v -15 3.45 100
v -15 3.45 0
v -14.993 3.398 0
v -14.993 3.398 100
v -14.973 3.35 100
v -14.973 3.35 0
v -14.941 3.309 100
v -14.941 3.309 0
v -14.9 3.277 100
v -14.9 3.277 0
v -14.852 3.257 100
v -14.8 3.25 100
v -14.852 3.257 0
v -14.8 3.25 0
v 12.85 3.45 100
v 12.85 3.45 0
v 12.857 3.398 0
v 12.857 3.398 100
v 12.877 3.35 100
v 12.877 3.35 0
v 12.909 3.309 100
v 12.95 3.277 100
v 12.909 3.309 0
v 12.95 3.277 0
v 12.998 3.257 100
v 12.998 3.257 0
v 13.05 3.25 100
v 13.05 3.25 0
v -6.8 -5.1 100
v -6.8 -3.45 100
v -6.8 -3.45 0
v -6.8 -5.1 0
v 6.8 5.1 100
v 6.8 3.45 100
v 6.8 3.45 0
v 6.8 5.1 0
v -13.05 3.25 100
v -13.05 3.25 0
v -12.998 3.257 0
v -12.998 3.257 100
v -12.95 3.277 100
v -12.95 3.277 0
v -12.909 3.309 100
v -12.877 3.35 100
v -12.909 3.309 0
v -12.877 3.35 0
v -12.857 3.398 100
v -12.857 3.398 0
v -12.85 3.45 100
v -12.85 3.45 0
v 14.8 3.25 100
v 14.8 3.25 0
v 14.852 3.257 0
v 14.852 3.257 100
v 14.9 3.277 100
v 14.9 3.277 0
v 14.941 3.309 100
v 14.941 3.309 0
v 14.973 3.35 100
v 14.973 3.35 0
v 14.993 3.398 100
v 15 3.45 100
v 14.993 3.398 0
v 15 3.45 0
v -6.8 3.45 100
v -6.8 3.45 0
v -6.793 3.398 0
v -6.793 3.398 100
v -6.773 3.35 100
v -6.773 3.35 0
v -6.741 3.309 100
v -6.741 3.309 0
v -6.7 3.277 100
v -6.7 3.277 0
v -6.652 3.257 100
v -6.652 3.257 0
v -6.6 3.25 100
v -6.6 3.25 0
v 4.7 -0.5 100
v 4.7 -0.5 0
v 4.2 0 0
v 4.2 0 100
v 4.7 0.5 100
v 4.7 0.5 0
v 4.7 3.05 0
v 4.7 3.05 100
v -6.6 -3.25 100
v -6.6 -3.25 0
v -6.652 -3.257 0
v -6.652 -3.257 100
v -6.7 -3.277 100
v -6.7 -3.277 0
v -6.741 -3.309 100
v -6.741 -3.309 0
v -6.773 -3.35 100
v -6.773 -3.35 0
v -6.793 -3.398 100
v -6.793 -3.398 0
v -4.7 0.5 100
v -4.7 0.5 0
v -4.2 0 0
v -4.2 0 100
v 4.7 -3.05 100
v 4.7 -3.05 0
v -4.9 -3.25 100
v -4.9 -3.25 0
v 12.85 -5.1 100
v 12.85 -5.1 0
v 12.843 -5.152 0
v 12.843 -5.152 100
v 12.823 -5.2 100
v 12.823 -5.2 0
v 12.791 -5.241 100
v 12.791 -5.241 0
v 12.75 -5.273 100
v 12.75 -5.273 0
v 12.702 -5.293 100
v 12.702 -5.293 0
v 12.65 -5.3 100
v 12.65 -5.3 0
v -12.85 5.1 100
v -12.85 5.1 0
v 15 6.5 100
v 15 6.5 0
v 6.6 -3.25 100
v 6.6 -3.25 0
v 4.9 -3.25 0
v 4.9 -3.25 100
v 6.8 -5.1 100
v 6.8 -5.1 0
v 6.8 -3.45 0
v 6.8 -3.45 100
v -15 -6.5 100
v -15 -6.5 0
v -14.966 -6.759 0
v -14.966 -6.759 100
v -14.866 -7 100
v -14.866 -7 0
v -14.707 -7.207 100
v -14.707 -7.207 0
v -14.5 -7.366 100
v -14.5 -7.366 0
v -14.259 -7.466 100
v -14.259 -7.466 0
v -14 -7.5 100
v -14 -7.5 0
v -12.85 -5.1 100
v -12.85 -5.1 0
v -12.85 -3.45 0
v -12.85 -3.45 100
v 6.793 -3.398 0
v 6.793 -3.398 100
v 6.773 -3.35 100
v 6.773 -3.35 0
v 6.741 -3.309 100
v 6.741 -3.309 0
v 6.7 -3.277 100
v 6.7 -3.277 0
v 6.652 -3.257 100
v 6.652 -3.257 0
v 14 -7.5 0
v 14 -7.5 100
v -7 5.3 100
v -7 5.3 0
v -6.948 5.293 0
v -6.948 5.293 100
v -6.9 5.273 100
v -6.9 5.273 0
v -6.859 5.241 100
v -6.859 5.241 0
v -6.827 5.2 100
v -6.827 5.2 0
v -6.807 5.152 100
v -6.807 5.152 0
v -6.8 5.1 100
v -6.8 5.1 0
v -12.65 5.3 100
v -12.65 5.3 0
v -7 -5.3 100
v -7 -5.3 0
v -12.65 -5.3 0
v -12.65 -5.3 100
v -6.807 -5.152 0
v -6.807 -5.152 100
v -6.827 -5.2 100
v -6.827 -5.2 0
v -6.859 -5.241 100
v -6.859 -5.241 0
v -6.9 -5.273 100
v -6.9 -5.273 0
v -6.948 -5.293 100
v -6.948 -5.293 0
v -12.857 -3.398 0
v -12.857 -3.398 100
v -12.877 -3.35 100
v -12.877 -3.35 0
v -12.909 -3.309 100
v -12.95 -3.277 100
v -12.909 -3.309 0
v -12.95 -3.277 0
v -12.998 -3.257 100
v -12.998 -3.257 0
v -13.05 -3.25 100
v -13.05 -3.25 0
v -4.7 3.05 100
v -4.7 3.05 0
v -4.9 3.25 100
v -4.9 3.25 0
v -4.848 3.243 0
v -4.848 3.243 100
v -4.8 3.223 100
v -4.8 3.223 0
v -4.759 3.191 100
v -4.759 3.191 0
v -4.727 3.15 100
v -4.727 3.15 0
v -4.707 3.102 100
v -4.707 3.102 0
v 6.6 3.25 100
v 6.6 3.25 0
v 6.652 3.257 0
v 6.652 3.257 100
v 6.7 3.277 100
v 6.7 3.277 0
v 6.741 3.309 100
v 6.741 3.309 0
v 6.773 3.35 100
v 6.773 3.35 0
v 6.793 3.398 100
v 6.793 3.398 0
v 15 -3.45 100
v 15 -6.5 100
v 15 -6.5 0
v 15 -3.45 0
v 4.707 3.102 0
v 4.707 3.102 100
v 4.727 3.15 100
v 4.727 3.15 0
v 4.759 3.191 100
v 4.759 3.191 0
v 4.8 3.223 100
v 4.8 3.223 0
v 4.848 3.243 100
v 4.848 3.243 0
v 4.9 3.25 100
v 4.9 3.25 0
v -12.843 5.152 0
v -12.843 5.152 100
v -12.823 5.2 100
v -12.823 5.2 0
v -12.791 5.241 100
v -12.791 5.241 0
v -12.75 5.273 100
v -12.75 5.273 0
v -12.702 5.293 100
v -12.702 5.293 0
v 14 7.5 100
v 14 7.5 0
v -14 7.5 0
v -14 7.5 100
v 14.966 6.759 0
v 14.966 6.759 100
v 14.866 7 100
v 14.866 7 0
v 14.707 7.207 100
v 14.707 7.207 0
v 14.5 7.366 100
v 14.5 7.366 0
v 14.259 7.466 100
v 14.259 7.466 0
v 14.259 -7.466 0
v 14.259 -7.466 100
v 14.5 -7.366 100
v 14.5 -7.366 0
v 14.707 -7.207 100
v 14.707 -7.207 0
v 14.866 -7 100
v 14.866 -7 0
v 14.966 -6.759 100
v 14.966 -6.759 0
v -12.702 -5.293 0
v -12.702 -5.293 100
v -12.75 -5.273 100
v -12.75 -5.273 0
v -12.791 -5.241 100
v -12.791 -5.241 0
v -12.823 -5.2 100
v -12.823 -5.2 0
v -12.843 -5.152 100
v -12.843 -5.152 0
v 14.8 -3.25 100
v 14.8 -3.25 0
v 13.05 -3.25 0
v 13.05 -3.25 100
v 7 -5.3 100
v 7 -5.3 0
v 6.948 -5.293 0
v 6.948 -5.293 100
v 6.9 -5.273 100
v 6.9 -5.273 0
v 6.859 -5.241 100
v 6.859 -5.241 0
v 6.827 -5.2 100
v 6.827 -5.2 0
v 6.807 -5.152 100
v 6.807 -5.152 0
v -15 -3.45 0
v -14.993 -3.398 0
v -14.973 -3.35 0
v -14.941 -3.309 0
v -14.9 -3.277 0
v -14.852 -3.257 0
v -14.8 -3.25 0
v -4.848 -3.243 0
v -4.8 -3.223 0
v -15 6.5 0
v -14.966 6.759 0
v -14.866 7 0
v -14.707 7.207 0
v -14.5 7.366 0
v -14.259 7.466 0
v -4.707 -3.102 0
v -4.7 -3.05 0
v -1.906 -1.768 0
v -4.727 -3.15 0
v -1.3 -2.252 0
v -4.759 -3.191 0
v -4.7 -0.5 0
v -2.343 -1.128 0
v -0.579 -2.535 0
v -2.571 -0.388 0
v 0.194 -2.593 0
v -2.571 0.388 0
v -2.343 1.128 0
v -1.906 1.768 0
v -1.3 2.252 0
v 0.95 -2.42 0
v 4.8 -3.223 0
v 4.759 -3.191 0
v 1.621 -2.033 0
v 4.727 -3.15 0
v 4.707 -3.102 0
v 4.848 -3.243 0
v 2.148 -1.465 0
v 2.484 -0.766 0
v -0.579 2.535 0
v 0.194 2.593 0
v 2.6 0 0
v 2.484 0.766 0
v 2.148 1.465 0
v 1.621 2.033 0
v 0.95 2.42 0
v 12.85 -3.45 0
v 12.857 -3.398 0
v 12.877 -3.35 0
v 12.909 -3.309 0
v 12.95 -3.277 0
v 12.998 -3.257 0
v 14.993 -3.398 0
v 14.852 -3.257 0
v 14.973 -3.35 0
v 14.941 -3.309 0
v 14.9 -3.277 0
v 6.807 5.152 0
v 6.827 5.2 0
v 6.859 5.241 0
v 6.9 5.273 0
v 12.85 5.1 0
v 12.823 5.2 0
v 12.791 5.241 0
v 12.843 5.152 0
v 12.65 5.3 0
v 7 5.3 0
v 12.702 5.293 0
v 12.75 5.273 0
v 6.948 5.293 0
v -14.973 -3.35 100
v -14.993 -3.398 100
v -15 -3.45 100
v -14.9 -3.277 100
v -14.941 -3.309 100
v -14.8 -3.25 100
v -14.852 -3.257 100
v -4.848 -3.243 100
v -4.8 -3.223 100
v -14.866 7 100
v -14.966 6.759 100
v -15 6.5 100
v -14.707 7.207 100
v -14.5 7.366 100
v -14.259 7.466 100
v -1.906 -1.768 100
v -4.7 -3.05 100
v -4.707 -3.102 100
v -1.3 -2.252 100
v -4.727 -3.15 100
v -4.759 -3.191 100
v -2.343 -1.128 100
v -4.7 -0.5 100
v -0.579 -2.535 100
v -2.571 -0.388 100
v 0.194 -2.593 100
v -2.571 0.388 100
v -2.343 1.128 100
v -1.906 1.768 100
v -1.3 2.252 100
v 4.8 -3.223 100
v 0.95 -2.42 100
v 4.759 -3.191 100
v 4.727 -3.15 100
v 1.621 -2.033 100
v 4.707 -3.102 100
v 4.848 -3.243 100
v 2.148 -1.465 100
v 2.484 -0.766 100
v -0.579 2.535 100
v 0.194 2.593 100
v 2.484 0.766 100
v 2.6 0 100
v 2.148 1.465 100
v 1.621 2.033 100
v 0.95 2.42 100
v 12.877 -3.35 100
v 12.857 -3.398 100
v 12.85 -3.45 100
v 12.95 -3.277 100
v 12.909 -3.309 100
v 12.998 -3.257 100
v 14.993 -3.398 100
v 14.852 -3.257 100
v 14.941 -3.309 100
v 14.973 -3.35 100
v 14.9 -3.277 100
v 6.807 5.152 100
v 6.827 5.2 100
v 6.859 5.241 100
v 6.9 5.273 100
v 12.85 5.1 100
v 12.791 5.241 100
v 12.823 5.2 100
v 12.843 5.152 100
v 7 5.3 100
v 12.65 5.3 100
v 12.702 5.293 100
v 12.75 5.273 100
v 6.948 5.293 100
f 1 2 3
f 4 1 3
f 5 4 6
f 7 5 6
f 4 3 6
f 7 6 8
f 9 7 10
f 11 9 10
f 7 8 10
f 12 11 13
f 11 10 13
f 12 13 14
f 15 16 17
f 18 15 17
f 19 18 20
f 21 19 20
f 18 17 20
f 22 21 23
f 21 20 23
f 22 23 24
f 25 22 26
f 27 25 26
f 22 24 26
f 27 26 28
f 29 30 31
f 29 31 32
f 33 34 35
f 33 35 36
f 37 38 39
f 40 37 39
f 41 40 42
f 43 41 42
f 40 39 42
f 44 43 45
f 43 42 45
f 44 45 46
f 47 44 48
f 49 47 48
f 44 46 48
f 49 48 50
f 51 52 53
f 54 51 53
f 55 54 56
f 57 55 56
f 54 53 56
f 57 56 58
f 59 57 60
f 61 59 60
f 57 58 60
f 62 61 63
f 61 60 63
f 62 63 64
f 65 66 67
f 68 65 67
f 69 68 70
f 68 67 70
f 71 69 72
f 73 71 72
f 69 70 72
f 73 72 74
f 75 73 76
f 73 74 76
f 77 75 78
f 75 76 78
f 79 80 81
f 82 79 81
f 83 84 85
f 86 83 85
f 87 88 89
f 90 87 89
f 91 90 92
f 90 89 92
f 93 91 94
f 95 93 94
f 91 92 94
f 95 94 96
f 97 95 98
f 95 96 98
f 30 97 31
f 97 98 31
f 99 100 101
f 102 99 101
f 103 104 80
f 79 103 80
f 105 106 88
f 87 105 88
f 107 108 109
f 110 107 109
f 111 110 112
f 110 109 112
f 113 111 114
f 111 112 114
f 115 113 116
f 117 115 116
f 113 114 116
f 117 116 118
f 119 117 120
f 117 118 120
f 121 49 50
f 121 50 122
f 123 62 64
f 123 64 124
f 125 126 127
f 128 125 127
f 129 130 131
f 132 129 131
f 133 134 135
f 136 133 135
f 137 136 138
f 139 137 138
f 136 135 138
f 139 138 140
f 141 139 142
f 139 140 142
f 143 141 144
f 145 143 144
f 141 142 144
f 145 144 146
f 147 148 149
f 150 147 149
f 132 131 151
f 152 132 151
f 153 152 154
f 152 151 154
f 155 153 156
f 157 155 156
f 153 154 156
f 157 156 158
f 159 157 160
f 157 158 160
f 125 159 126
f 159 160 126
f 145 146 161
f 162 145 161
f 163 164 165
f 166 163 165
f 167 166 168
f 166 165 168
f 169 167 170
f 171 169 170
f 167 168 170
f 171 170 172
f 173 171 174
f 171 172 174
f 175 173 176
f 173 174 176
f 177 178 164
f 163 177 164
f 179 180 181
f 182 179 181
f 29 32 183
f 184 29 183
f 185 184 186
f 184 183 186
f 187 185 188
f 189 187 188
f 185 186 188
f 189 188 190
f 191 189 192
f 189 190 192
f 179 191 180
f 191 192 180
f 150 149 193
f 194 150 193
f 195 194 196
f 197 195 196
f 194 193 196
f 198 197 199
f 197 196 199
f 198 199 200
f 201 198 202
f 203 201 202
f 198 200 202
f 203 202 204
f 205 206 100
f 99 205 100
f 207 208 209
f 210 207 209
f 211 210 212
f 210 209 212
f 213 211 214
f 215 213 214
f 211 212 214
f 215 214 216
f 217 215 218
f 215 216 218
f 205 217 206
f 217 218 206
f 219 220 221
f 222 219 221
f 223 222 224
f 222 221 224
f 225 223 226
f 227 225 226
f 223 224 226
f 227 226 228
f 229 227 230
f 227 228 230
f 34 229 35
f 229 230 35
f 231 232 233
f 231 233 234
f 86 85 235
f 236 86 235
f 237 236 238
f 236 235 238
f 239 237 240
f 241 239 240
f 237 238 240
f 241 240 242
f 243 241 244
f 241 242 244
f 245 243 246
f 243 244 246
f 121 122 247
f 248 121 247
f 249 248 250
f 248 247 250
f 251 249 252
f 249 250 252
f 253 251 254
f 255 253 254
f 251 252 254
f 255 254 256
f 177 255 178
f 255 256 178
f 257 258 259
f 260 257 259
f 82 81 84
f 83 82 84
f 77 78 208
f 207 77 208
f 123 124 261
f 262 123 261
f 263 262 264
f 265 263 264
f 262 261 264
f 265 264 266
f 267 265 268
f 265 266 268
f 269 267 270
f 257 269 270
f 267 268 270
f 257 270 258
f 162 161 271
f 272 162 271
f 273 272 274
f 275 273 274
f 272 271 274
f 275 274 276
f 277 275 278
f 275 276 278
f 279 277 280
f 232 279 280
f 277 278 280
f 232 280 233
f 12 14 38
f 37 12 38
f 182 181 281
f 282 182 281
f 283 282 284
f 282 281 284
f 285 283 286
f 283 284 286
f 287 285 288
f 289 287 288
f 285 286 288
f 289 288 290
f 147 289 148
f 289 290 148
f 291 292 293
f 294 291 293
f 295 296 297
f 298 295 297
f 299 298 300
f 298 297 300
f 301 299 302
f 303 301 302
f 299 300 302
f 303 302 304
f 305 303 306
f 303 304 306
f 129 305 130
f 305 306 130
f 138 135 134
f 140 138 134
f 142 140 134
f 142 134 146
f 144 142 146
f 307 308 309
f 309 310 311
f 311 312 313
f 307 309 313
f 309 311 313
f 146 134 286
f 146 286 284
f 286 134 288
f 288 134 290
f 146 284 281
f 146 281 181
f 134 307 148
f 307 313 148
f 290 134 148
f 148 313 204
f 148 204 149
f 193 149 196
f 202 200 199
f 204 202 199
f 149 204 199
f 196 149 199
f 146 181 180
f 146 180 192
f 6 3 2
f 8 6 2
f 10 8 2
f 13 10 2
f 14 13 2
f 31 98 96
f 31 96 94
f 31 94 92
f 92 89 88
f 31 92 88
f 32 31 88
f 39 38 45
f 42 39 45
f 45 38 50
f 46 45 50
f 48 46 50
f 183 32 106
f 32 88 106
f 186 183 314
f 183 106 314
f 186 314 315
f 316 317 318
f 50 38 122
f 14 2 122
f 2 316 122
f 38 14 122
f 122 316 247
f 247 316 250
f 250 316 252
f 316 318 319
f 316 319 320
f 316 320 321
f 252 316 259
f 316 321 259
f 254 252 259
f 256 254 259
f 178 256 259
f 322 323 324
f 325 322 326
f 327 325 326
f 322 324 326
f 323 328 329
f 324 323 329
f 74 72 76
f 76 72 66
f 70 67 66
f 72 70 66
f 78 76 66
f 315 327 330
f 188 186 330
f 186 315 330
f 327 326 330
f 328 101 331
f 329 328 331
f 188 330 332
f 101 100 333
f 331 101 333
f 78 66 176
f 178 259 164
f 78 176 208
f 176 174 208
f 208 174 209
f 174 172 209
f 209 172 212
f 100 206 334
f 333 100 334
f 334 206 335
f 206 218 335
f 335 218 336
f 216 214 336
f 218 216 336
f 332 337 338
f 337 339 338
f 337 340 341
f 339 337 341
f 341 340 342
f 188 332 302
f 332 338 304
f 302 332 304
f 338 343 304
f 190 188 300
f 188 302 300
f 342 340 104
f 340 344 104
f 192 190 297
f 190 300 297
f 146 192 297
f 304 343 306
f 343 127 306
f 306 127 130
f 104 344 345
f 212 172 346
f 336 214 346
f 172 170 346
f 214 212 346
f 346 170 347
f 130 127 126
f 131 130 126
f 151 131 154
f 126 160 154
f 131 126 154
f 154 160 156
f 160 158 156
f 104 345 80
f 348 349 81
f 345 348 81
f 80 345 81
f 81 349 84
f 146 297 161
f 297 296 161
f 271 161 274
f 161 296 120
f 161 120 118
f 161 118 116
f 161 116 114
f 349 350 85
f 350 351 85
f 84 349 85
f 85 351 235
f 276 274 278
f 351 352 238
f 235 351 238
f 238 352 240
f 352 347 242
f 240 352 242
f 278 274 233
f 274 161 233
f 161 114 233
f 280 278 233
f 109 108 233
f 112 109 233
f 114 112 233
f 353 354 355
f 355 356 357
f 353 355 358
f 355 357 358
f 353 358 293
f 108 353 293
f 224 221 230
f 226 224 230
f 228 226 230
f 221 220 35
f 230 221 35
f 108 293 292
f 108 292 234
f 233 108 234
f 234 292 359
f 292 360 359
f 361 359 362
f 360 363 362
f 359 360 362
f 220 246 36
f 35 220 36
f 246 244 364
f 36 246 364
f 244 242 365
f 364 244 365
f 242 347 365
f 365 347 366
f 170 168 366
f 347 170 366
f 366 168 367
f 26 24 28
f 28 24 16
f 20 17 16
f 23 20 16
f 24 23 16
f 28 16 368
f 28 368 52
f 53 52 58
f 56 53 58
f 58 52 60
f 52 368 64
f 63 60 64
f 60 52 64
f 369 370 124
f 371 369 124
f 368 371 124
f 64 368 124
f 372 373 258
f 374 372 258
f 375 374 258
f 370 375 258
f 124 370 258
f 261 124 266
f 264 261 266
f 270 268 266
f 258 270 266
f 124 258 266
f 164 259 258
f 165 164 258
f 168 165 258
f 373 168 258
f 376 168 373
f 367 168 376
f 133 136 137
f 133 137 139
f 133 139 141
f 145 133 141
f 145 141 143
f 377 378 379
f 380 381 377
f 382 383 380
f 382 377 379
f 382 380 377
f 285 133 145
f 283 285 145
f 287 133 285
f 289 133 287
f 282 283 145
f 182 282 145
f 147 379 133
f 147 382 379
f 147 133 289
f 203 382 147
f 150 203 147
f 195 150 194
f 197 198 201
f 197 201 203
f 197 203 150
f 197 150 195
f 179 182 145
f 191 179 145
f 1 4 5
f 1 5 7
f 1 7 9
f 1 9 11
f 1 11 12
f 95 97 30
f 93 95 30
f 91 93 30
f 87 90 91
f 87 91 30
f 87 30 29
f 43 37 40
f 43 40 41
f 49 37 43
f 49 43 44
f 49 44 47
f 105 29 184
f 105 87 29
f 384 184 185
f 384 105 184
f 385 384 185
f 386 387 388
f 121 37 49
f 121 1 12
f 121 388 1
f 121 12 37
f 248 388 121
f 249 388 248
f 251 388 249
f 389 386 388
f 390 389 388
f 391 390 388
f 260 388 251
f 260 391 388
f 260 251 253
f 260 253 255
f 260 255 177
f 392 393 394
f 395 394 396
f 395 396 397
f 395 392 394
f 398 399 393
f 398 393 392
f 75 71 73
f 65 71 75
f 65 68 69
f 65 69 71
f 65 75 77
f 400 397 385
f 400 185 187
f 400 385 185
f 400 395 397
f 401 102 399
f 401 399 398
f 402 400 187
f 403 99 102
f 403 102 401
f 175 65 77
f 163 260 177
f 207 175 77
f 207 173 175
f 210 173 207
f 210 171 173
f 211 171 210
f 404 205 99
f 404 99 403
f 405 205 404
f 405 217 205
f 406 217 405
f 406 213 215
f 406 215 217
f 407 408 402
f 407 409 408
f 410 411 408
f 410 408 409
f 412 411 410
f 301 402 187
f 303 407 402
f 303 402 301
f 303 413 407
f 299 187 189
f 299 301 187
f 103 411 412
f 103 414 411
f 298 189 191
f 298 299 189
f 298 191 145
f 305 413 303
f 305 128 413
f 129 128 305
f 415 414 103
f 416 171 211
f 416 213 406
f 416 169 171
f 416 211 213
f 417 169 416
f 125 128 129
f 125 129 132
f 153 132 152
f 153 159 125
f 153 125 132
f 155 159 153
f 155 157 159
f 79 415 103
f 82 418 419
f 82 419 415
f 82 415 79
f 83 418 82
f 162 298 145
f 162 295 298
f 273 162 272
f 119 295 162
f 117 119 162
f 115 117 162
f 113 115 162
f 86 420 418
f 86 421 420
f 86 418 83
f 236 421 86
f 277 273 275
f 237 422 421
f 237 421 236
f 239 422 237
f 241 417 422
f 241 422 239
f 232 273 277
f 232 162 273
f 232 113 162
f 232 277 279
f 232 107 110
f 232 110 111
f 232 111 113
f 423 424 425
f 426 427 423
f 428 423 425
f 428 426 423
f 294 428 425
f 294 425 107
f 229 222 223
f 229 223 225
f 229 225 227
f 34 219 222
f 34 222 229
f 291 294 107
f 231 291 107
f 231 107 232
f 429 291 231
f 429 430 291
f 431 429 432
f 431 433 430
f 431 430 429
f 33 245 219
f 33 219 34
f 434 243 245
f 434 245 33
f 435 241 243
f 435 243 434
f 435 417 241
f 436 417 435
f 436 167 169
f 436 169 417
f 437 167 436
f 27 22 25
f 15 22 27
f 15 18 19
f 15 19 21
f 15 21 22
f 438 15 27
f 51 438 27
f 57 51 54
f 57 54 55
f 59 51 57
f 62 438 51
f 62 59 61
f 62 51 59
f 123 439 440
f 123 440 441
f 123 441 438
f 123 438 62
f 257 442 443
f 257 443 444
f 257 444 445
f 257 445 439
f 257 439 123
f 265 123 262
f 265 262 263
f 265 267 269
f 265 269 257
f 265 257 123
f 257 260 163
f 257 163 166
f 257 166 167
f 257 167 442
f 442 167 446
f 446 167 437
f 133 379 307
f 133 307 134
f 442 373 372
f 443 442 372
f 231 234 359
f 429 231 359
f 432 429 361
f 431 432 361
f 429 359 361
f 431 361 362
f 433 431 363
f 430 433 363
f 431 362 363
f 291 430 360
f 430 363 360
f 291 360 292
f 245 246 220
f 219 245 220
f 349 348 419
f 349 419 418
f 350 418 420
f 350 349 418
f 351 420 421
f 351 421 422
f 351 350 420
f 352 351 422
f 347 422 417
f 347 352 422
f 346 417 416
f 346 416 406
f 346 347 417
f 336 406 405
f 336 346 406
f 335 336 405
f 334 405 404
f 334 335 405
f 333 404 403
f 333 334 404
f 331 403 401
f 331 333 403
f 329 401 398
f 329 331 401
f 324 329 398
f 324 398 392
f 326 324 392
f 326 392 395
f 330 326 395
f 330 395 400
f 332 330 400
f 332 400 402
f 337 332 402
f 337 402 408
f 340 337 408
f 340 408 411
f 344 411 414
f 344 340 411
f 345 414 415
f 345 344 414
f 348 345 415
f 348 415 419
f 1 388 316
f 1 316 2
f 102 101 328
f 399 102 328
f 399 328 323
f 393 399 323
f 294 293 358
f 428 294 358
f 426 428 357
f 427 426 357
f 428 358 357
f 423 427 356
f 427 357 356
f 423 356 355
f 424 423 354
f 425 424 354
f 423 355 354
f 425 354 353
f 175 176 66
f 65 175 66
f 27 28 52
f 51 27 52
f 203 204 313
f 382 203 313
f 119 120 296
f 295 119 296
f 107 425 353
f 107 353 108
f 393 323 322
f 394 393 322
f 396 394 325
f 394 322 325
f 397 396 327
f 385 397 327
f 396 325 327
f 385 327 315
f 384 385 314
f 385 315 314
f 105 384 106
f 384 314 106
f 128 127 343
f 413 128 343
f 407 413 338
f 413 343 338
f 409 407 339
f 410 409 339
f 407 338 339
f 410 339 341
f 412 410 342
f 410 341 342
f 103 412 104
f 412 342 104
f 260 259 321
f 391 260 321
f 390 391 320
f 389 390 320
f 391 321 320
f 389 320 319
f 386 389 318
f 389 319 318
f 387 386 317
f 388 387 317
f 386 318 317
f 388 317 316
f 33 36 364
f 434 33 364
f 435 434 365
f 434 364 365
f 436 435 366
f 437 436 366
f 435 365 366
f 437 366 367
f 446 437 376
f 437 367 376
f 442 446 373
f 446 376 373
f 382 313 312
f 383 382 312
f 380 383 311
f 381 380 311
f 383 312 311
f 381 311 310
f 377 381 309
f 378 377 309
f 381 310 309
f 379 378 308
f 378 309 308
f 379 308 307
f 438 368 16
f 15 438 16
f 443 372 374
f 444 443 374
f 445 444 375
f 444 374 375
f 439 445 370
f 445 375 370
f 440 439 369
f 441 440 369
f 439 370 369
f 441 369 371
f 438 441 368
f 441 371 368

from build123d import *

# Parameters (mm, degrees)
SKETCH_1_R      = 2.6
EXTRUDE_1_DEPTH = 100


with BuildPart() as part:
    # 草图1 → 凸台-拉伸1 (new body)
    with BuildSketch(Plane.XY):
        with BuildLine():
            Line((-4.7, 0.5), (-4.2, 0))
            Line((-4.2, 0), (-4.7, -0.5))
            Line((-4.7, -0.5), (-4.7, -3.05))
            ThreePointArc((-4.7, -3.05), (-4.758578644, -3.191421356), (-4.9, -3.25))
            Line((-4.9, -3.25), (-6.6, -3.25))
            ThreePointArc((-6.6, -3.25), (-6.741421356, -3.308578644), (-6.8, -3.45))
            Line((-6.8, -3.45), (-6.8, -5.1))
            ThreePointArc((-6.8, -5.1), (-6.858578644, -5.241421356), (-7, -5.3))
            Line((-7, -5.3), (-12.65, -5.3))
            ThreePointArc((-12.65, -5.3), (-12.791421356, -5.241421356), (-12.85, -5.1))
            Line((-12.85, -5.1), (-12.85, -3.45))
            ThreePointArc((-12.85, -3.45), (-12.908578644, -3.308578644), (-13.05, -3.25))
            Line((-13.05, -3.25), (-14.8, -3.25))
            ThreePointArc((-14.8, -3.25), (-14.941421356, -3.308578644), (-15, -3.45))
            Line((-15, -3.45), (-15, -6.5))
            ThreePointArc((-15, -6.5), (-14.707106781, -7.207106781), (-14, -7.5))
            Line((-14, -7.5), (14, -7.5))
            ThreePointArc((14, -7.5), (14.707106781, -7.207106781), (15, -6.5))
            Line((15, -6.5), (15, -3.45))
            ThreePointArc((15, -3.45), (14.941421356, -3.308578644), (14.8, -3.25))
            Line((14.8, -3.25), (13.05, -3.25))
            ThreePointArc((13.05, -3.25), (12.908578644, -3.308578644), (12.85, -3.45))
            Line((12.85, -3.45), (12.85, -5.1))
            ThreePointArc((12.85, -5.1), (12.791421356, -5.241421356), (12.65, -5.3))
            Line((12.65, -5.3), (7, -5.3))
            ThreePointArc((7, -5.3), (6.858578644, -5.241421356), (6.8, -5.1))
            Line((6.8, -5.1), (6.8, -3.45))
            ThreePointArc((6.8, -3.45), (6.741421356, -3.308578644), (6.6, -3.25))
            Line((6.6, -3.25), (4.9, -3.25))
            ThreePointArc((4.9, -3.25), (4.758578644, -3.191421356), (4.7, -3.05))
            Line((4.7, -3.05), (4.7, -0.5))
            Line((4.7, -0.5), (4.2, 0))
            Line((4.2, 0), (4.7, 0.5))
            Line((4.7, 0.5), (4.7, 3.05))
            ThreePointArc((4.7, 3.05), (4.758578644, 3.191421356), (4.9, 3.25))
            Line((4.9, 3.25), (6.6, 3.25))
            ThreePointArc((6.6, 3.25), (6.741421356, 3.308578644), (6.8, 3.45))
            Line((6.8, 3.45), (6.8, 5.1))
            ThreePointArc((6.8, 5.1), (6.858578644, 5.241421356), (7, 5.3))
            Line((7, 5.3), (12.65, 5.3))
            ThreePointArc((12.65, 5.3), (12.791421356, 5.241421356), (12.85, 5.1))
            Line((12.85, 5.1), (12.85, 3.45))
            ThreePointArc((12.85, 3.45), (12.908578644, 3.308578644), (13.05, 3.25))
            Line((13.05, 3.25), (14.8, 3.25))
            ThreePointArc((14.8, 3.25), (14.941421356, 3.308578644), (15, 3.45))
            Line((15, 3.45), (15, 6.5))
            ThreePointArc((15, 6.5), (14.707106781, 7.207106781), (14, 7.5))
            Line((14, 7.5), (-14, 7.5))
            ThreePointArc((-14, 7.5), (-14.707106781, 7.207106781), (-15, 6.5))
            Line((-15, 6.5), (-15, 3.45))
            ThreePointArc((-15, 3.45), (-14.941421356, 3.308578644), (-14.8, 3.25))
            Line((-14.8, 3.25), (-13.05, 3.25))
            ThreePointArc((-13.05, 3.25), (-12.908578644, 3.308578644), (-12.85, 3.45))
            Line((-12.85, 3.45), (-12.85, 5.1))
            ThreePointArc((-12.85, 5.1), (-12.791421356, 5.241421356), (-12.65, 5.3))
            Line((-12.65, 5.3), (-7, 5.3))
            ThreePointArc((-7, 5.3), (-6.858578644, 5.241421356), (-6.8, 5.1))
            Line((-6.8, 5.1), (-6.8, 3.45))
            ThreePointArc((-6.8, 3.45), (-6.741421356, 3.308578644), (-6.6, 3.25))
            Line((-6.6, 3.25), (-4.9, 3.25))
            ThreePointArc((-4.9, 3.25), (-4.758578644, 3.191421356), (-4.7, 3.05))
            Line((-4.7, 3.05), (-4.7, 0.5))
        make_face()
        Circle(SKETCH_1_R, mode=Mode.SUBTRACT)
    extrude(amount=EXTRUDE_1_DEPTH)


solid = part.part
